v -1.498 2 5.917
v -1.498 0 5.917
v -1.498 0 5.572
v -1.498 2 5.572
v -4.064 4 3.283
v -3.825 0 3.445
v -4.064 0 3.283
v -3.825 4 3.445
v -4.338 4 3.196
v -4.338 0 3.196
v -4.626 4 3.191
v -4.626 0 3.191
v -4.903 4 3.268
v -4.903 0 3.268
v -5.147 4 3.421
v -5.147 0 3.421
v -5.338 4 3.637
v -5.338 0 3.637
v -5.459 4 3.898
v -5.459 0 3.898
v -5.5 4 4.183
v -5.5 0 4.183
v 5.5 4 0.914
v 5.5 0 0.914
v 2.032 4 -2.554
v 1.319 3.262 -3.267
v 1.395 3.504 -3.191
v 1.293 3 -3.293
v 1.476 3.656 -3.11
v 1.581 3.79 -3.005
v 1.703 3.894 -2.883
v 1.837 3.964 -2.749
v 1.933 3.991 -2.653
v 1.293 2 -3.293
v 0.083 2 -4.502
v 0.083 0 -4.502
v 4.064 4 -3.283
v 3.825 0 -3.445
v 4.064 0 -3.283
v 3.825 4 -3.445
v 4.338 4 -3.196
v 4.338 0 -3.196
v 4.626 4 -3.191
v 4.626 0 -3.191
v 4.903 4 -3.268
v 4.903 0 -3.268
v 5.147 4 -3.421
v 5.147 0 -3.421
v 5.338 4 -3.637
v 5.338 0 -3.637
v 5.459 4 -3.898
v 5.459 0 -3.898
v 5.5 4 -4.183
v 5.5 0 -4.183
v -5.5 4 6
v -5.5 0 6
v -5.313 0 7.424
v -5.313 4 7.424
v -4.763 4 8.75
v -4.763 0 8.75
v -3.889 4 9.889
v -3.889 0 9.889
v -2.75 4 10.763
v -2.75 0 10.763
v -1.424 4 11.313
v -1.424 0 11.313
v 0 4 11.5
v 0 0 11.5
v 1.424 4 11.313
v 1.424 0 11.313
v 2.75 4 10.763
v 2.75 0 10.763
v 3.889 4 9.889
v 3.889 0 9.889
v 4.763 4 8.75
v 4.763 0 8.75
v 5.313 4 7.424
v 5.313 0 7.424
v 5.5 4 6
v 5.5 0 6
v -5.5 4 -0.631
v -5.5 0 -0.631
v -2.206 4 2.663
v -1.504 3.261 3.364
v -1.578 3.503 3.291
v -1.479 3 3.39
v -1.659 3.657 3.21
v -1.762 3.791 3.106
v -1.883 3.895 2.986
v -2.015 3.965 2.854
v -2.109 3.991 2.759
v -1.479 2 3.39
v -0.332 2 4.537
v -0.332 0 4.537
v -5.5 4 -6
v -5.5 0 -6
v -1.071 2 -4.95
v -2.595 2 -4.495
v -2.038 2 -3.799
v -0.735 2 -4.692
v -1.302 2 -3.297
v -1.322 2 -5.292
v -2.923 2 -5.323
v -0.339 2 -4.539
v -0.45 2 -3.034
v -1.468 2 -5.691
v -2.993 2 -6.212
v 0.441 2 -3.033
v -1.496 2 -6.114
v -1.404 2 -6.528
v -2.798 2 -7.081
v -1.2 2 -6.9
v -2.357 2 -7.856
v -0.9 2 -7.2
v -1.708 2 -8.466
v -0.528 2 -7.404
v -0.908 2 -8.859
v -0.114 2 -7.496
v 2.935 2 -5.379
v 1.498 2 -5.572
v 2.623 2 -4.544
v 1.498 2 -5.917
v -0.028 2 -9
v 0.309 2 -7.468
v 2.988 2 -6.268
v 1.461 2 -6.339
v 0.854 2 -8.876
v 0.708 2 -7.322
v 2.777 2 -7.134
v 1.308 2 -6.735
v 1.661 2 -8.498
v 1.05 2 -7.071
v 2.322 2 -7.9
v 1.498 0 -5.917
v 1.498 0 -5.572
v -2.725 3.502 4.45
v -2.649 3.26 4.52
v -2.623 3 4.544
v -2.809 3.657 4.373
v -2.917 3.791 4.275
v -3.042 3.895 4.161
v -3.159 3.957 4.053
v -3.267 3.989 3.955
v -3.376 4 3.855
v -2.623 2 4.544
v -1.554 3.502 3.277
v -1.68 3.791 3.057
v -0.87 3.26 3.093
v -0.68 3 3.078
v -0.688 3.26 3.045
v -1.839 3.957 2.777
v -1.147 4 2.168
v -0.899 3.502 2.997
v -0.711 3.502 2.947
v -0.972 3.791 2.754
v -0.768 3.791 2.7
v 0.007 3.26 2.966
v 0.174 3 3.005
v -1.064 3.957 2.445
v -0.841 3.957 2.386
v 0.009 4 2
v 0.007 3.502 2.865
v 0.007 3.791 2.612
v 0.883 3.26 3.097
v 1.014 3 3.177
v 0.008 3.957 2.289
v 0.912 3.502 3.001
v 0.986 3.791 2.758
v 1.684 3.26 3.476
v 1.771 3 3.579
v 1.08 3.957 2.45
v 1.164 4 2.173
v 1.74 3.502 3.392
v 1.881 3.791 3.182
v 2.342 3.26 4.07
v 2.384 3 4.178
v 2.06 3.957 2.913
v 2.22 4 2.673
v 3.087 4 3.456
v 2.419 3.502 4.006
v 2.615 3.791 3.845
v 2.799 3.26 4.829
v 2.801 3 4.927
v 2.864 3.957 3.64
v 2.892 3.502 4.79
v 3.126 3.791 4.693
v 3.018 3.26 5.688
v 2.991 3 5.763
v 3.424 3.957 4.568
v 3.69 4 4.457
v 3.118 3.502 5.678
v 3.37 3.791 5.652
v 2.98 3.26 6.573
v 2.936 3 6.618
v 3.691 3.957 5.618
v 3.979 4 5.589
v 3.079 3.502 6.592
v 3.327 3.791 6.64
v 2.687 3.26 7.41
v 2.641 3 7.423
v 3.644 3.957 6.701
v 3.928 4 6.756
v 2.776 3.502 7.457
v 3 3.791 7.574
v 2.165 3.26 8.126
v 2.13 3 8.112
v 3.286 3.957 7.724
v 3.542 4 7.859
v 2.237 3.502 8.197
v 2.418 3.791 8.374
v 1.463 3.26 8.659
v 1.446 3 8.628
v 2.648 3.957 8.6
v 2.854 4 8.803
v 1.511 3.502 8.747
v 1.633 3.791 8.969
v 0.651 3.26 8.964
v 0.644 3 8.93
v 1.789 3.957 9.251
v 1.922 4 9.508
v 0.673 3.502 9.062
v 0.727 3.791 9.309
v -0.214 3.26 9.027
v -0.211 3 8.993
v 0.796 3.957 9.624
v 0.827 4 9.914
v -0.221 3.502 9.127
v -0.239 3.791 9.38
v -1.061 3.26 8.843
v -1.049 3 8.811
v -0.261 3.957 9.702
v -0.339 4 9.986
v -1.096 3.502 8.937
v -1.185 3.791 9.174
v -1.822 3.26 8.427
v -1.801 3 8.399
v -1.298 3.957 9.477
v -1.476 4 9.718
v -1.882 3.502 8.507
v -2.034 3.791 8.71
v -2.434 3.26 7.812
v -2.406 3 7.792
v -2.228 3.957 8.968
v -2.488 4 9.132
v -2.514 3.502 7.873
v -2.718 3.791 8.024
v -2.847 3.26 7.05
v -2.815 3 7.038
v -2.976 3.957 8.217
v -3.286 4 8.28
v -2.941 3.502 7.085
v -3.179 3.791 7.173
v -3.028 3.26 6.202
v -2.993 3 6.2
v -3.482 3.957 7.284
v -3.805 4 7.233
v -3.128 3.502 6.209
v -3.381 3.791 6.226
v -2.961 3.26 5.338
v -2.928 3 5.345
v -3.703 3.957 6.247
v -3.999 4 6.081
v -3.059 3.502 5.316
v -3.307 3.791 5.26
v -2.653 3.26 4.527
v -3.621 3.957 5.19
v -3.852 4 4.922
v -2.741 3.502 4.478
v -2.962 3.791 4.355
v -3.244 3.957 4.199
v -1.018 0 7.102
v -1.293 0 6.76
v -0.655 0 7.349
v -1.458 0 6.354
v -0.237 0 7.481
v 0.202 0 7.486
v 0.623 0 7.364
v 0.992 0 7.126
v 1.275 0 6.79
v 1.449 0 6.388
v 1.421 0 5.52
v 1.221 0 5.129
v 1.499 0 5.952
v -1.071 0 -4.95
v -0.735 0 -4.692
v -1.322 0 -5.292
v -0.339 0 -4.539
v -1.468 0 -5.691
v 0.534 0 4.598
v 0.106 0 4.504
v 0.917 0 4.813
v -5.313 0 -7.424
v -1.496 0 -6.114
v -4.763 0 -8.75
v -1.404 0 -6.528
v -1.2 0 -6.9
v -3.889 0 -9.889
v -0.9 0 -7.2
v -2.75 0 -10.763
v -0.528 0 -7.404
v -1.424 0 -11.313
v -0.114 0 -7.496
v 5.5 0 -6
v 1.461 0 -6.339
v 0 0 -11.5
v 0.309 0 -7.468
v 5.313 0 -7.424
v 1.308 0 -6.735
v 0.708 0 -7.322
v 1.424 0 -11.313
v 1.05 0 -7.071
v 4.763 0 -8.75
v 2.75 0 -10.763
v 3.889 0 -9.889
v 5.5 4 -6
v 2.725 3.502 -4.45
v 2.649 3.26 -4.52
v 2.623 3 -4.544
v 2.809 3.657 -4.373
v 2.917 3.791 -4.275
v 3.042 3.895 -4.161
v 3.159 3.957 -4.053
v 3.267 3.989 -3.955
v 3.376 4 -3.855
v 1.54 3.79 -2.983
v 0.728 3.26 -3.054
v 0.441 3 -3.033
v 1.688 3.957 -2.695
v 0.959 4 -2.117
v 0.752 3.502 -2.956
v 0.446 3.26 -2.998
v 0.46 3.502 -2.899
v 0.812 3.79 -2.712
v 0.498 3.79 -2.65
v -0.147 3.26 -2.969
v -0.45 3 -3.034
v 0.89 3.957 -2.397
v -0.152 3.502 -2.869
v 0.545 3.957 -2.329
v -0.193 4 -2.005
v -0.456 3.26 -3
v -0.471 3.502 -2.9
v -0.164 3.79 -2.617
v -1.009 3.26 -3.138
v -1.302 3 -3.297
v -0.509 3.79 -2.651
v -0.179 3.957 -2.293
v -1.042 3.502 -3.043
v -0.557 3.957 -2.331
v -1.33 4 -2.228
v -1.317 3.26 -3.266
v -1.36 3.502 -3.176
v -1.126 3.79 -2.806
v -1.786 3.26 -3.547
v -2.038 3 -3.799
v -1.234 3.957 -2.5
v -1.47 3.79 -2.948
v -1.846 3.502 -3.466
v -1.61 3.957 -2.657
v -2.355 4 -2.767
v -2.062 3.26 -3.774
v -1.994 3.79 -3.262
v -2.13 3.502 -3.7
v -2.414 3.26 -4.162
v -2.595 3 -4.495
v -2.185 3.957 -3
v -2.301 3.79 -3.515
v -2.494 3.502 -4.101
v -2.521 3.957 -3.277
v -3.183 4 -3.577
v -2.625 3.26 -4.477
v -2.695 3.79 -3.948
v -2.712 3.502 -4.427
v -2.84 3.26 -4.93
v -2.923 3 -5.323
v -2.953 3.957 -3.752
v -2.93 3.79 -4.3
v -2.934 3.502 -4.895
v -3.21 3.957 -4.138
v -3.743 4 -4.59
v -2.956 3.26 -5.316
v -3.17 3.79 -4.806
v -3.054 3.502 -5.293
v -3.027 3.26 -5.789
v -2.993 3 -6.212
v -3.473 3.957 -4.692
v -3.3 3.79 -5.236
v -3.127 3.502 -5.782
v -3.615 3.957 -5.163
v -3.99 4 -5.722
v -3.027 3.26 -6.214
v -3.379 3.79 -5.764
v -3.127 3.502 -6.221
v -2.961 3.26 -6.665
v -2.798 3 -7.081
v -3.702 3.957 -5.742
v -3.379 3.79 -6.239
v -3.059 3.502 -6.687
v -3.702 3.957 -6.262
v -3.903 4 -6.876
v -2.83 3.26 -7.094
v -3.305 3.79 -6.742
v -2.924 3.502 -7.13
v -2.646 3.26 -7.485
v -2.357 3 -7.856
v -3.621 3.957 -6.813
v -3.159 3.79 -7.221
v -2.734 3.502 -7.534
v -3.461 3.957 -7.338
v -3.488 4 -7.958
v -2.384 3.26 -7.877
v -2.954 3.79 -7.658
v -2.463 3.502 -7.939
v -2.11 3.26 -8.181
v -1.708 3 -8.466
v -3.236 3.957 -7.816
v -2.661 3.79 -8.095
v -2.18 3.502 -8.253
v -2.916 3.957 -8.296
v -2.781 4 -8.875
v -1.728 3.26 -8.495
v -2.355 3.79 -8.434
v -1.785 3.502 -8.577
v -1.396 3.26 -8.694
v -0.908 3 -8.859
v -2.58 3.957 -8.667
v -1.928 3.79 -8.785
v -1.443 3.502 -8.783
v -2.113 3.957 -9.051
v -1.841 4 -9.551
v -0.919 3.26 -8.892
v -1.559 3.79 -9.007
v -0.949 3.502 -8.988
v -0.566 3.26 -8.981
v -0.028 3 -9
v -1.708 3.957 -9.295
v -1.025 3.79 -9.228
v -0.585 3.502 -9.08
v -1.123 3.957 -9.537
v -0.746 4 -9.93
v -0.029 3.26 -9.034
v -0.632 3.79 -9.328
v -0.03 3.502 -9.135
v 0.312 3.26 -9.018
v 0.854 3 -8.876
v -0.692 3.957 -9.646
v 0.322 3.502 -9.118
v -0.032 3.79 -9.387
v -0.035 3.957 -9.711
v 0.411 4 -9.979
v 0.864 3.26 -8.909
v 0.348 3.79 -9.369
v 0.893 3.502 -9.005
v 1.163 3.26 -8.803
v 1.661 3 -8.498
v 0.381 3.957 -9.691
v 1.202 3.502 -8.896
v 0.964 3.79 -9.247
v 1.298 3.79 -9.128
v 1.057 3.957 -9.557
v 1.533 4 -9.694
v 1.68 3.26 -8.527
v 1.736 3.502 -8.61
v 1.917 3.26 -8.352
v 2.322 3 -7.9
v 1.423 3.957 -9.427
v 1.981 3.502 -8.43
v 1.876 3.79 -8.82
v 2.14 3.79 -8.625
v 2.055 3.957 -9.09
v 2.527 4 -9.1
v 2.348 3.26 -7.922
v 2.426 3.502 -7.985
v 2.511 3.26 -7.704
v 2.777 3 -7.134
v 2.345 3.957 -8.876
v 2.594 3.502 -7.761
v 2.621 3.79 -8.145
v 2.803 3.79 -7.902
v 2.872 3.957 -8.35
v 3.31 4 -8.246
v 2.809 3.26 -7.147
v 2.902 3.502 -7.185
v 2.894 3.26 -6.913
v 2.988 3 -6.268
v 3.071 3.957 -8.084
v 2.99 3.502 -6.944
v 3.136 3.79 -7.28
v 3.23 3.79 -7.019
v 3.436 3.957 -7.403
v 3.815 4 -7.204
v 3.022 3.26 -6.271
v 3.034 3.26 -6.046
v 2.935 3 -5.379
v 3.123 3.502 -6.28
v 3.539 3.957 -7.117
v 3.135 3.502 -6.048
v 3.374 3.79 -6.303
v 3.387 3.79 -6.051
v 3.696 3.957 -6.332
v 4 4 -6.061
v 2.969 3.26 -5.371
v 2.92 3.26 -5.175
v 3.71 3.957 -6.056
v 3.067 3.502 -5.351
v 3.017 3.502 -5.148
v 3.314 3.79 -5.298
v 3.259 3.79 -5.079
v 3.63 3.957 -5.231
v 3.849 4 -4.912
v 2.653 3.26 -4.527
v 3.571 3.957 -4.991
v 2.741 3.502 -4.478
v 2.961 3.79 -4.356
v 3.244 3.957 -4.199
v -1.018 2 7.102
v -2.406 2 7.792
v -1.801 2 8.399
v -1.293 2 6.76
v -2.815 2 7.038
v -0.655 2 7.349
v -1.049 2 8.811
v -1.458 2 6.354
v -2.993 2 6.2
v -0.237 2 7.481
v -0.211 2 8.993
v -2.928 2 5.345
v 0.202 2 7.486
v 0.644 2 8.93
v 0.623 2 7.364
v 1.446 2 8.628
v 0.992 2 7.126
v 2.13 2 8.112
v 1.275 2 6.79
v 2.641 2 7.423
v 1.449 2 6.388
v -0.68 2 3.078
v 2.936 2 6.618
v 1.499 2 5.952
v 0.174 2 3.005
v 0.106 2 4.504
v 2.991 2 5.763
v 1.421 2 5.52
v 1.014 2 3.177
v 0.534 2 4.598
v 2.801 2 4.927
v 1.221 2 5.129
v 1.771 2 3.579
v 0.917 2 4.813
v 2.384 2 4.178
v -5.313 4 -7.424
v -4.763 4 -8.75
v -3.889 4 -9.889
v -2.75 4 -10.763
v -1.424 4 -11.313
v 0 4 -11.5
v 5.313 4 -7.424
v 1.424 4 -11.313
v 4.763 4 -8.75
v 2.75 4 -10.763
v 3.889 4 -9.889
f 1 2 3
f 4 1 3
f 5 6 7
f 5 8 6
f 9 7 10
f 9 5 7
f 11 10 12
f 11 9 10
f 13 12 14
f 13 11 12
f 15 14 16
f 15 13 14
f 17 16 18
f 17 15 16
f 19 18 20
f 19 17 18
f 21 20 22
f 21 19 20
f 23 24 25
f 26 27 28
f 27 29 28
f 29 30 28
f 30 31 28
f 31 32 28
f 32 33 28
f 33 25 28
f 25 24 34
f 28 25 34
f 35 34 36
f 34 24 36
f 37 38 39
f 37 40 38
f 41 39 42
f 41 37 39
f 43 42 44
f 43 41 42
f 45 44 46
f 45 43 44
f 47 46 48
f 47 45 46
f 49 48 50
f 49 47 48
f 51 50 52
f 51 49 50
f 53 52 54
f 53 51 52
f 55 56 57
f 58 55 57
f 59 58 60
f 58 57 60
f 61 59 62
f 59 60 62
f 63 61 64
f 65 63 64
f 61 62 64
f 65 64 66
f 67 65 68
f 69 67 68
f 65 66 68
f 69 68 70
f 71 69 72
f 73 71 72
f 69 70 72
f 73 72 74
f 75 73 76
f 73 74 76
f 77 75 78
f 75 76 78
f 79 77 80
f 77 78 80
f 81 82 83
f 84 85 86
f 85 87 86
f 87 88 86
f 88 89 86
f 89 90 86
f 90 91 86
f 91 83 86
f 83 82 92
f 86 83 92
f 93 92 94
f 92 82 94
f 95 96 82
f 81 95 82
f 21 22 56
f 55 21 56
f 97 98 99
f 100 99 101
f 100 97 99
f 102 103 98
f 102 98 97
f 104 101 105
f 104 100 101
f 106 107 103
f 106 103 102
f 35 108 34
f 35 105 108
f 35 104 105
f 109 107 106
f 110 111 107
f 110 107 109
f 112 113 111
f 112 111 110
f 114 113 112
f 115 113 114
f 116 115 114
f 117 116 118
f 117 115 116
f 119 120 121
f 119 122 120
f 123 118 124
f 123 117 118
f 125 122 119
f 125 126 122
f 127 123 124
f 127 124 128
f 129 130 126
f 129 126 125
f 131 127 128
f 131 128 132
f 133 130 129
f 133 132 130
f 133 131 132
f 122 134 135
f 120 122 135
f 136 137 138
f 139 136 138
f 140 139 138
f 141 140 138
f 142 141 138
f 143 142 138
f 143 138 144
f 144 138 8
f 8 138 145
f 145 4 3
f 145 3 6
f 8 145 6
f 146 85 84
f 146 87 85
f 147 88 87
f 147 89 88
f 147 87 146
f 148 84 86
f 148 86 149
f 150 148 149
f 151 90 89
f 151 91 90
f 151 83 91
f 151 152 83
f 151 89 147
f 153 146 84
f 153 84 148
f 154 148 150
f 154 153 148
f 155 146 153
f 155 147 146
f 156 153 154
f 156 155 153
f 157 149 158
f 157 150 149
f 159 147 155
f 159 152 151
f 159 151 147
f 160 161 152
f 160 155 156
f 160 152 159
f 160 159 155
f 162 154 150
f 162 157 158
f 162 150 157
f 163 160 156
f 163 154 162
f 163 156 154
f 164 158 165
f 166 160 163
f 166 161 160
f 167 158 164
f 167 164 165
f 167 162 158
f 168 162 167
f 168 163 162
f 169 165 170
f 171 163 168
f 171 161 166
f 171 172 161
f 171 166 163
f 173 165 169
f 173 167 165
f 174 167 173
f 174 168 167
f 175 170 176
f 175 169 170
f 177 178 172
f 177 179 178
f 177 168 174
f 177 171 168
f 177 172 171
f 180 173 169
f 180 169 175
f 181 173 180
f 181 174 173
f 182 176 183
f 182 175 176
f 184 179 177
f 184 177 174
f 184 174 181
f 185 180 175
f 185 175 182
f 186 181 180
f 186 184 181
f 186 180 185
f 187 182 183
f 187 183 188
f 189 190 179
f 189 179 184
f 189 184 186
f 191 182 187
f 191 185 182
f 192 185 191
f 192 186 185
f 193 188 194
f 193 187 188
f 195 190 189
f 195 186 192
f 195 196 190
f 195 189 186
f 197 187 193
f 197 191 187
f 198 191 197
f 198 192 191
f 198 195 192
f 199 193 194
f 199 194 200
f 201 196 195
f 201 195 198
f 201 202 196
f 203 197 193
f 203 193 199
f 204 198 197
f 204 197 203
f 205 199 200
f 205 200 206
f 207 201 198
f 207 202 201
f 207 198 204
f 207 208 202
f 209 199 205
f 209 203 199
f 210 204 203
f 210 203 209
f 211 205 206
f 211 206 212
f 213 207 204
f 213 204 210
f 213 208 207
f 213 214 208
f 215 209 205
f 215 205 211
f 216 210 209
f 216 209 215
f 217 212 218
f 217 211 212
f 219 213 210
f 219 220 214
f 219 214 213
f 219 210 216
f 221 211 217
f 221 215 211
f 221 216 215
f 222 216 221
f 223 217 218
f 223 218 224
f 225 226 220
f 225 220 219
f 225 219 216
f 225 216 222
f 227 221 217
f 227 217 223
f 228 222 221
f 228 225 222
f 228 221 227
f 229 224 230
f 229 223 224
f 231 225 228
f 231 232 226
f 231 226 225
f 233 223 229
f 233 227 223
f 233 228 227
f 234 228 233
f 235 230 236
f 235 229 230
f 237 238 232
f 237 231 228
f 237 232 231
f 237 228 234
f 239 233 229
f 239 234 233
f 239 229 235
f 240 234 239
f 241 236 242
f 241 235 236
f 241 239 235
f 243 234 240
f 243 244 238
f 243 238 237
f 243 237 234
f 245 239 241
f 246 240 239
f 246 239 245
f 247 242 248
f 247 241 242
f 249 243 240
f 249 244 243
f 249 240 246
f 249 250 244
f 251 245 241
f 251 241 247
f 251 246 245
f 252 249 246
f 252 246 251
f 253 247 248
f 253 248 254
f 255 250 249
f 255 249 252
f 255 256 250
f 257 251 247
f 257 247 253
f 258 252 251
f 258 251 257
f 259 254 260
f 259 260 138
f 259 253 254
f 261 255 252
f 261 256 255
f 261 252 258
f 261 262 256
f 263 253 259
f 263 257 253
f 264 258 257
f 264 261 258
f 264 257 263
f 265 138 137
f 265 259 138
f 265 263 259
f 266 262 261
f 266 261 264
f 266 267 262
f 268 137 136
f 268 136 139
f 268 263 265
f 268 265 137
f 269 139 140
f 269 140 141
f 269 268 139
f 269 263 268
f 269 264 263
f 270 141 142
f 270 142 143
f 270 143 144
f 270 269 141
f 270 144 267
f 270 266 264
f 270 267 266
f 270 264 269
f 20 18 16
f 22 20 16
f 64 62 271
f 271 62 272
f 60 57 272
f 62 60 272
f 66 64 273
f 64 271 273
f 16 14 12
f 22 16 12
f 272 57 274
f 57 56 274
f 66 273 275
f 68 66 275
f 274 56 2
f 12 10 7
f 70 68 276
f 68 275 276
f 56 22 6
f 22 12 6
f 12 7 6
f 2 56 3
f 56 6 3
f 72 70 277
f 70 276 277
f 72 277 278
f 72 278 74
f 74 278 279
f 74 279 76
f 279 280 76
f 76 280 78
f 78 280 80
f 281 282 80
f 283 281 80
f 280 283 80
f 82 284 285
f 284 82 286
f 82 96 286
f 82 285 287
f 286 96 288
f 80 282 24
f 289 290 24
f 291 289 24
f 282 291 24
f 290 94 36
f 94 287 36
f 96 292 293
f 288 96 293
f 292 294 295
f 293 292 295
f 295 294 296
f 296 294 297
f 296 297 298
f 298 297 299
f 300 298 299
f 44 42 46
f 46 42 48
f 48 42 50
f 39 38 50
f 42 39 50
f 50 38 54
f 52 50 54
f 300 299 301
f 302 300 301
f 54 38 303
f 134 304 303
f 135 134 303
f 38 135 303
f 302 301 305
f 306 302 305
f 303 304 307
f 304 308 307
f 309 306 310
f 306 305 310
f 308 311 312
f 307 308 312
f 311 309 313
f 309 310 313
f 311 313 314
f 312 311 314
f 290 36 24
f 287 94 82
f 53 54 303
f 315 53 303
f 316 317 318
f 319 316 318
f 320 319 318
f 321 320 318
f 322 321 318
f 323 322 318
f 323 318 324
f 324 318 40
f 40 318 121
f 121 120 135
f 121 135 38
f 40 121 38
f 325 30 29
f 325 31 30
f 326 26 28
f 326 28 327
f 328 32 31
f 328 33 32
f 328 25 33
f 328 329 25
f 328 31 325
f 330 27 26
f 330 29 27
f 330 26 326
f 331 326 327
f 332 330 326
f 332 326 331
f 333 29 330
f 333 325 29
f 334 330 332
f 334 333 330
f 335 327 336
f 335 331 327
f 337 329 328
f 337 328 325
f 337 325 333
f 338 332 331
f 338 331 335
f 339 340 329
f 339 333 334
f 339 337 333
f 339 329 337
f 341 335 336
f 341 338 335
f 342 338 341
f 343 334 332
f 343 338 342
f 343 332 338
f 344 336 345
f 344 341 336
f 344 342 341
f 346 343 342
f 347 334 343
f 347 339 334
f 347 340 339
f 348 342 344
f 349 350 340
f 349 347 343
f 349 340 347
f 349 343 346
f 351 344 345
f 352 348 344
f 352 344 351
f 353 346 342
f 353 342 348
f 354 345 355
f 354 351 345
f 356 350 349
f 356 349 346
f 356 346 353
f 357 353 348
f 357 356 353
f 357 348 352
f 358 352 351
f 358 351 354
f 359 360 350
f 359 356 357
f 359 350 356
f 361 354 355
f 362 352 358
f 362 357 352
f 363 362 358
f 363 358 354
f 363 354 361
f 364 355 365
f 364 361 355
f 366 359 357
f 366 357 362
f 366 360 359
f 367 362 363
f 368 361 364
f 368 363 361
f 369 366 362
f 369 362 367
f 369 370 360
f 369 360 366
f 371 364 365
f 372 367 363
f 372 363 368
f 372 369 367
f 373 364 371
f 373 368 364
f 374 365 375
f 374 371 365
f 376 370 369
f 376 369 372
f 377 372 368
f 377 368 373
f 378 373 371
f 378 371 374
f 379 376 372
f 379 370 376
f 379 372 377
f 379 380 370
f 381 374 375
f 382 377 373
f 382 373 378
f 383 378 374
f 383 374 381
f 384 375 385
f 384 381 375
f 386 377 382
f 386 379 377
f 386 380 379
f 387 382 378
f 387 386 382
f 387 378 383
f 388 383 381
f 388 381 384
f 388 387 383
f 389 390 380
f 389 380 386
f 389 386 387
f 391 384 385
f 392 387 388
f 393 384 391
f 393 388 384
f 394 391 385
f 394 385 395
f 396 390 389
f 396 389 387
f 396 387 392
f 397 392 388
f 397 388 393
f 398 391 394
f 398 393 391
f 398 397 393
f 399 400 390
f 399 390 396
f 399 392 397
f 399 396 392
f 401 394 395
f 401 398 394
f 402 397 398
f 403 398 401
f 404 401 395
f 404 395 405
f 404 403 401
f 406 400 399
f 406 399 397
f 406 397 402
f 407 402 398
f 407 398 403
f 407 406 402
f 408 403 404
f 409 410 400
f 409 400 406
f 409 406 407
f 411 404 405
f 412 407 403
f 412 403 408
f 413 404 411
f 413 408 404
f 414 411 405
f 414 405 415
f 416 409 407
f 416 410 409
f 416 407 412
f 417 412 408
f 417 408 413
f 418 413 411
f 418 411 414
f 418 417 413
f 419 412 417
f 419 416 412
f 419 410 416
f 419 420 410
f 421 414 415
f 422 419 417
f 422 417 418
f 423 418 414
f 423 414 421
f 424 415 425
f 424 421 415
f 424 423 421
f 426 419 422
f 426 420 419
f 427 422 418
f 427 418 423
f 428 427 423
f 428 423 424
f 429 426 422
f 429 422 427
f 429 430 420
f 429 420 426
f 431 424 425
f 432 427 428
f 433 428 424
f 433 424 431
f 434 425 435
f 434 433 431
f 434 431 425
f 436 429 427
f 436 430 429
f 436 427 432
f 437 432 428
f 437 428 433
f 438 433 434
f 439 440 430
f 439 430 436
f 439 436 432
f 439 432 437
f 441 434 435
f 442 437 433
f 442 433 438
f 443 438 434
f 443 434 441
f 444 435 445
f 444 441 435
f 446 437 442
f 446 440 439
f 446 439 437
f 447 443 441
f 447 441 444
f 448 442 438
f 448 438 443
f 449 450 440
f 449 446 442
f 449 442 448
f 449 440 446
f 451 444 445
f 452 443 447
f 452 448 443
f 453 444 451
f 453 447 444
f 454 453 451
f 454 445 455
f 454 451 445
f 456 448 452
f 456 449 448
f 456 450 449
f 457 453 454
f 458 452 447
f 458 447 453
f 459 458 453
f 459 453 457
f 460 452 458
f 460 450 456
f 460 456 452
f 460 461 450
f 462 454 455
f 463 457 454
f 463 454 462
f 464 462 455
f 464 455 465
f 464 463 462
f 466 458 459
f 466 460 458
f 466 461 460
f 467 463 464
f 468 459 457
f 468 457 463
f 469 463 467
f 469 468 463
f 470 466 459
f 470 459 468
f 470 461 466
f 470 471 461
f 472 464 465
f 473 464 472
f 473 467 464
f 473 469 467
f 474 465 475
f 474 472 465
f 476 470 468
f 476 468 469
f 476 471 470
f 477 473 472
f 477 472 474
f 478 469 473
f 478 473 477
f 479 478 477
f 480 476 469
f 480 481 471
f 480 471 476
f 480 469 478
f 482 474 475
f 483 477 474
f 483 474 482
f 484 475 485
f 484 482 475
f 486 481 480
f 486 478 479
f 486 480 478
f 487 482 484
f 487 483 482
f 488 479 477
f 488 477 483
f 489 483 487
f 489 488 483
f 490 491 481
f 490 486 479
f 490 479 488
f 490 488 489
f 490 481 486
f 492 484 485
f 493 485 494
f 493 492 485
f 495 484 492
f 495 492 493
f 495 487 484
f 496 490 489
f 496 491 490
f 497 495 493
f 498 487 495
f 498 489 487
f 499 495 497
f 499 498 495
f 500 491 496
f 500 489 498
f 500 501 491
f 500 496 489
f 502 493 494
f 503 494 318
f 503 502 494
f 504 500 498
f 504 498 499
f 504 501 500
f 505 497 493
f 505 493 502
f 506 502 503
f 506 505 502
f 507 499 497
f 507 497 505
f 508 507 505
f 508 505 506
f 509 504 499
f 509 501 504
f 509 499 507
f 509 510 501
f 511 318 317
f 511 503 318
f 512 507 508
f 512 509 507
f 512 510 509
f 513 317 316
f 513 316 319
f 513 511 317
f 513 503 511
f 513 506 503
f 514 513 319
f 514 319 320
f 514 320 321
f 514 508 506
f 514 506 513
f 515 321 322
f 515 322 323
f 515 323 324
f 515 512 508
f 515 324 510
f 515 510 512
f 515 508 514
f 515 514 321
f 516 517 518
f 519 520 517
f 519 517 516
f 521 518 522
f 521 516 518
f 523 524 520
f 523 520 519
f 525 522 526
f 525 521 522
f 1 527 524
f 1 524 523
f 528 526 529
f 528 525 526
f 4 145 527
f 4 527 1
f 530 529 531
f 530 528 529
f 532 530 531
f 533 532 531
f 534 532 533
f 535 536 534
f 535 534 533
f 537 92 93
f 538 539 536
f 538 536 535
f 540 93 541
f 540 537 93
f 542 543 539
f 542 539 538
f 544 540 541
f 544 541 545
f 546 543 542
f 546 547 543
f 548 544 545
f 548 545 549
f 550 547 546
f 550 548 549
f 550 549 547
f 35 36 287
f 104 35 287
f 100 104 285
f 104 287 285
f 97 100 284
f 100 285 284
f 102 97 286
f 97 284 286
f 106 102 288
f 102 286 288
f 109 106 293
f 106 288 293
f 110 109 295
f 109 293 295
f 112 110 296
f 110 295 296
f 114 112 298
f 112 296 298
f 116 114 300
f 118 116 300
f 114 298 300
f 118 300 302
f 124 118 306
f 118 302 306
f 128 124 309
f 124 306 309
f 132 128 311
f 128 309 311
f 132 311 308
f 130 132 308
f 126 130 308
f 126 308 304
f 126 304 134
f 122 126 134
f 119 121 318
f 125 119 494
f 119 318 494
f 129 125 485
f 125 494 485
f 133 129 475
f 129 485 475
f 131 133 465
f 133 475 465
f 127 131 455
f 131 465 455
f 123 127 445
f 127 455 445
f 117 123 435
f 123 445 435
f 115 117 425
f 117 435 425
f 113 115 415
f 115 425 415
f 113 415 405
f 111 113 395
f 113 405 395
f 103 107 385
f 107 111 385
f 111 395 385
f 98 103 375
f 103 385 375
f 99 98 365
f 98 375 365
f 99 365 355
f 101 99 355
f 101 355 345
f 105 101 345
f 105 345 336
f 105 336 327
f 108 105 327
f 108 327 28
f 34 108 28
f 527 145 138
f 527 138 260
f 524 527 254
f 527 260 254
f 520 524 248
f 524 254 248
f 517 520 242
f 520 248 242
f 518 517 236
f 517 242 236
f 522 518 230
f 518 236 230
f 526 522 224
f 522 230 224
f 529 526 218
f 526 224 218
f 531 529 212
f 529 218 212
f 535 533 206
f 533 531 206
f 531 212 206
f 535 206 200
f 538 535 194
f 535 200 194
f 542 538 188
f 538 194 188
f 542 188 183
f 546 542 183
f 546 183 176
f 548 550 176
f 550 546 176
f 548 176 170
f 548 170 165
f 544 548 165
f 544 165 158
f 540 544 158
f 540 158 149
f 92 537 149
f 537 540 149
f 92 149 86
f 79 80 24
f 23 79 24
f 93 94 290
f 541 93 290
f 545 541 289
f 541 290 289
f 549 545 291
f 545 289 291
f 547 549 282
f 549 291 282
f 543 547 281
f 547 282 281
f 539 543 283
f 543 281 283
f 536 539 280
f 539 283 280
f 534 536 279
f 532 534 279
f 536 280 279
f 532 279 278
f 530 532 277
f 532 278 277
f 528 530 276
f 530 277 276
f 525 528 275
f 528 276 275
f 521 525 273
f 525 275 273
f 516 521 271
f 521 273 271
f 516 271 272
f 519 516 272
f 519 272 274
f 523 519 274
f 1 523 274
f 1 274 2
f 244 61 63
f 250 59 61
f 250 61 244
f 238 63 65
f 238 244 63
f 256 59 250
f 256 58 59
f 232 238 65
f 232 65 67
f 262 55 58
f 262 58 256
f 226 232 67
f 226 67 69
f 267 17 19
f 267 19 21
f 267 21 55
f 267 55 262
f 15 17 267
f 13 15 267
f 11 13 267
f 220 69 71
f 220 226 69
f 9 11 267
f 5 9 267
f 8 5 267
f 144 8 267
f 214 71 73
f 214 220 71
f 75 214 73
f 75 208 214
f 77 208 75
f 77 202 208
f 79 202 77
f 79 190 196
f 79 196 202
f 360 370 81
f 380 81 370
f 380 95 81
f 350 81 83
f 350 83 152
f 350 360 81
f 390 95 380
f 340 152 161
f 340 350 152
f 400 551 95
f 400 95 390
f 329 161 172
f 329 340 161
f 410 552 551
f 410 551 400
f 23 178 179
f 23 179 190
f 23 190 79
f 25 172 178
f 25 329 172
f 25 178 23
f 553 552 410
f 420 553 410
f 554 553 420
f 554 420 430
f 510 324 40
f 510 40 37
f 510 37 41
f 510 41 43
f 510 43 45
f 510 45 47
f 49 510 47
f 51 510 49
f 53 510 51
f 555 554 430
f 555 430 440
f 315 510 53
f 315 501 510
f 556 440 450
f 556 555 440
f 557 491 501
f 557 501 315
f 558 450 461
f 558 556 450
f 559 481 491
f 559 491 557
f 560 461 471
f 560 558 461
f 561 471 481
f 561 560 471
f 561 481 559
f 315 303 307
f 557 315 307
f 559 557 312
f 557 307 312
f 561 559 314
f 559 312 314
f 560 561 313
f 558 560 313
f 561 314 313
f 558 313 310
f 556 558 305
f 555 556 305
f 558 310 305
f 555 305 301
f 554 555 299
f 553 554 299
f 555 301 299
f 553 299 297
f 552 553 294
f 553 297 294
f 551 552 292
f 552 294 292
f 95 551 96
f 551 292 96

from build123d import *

# Parameters (mm, degrees)
BOSS_EXTRUDE1_DEPTH = 4
FILLET1_R           = 1
SKETCH3_R           = 3
CUT_EXTRUDE1_DEPTH  = 2
FILLET2_R           = 1


with BuildPart() as part:
    # Sketch2 → Boss-Extrude1 (new body)
    with BuildSketch(Plane(origin=(0, 0, 0), x_dir=(1, 0, 0), z_dir=(0, 1, 0))):
        with BuildLine():
            Line((-5.5, 6), (-5.5, 0.63137085))
            Line((-5.5, 0.63137085), (-0.331532497, -4.537096653))
            ThreePointArc((-0.331532497, -4.537096653), (1.145519656, -6.968392853), (-1.497676196, -5.916537366))
            Line((-1.497676196, -5.916537366), (-1.497676196, -5.572307522))
            Line((-1.497676196, -5.572307522), (-5.5, -1.914213562))
            Line((-5.5, -1.914213562), (-5.5, -6))
            ThreePointArc((-5.5, -6), (0, -11.5), (5.5, -6))
            Line((5.5, -6), (5.5, -0.914213562))
            Line((5.5, -0.914213562), (0.083462634, 4.502323804))
            ThreePointArc((0.083462634, 4.502323804), (-1.060660172, 7.060660172), (1.497676196, 5.916537366))
            Line((1.497676196, 5.916537366), (1.497676196, 5.572307522))
            Line((1.497676196, 5.572307522), (5.5, 1.914213562))
            Line((5.5, 1.914213562), (5.5, 6))
            ThreePointArc((5.5, 6), (0, 11.5), (-5.5, 6))
        make_face()
    extrude(amount=BOSS_EXTRUDE1_DEPTH)

    # Fillet1
    fillet1_edges = [part.edges().sort_by_distance(p)[0] for p in [
        (5.5, 2, -1.914213562),
        (-5.5, 2, 1.914213562),
    ]]
    fillet(fillet1_edges, radius=FILLET1_R)

    # Sketch3 → Cut-Extrude1 (cut)
    with BuildSketch(Plane(origin=(0, 4, 0), x_dir=(1, 0, 0), z_dir=(0, 1, 0))):
        with Locations((0, 6)):
            Circle(SKETCH3_R)
        with Locations((0, -6)):
            Circle(SKETCH3_R)
    extrude(amount=-CUT_EXTRUDE1_DEPTH, mode=Mode.SUBTRACT)

    # Fillet2
    fillet2_edges = [part.edges().sort_by_distance(p)[0] for p in [
        (-2.055383003, 4, -8.185269024),
        (2.130491752, 4, 8.11210911),
    ]]
    fillet(fillet2_edges, radius=FILLET2_R)


solid = part.part
